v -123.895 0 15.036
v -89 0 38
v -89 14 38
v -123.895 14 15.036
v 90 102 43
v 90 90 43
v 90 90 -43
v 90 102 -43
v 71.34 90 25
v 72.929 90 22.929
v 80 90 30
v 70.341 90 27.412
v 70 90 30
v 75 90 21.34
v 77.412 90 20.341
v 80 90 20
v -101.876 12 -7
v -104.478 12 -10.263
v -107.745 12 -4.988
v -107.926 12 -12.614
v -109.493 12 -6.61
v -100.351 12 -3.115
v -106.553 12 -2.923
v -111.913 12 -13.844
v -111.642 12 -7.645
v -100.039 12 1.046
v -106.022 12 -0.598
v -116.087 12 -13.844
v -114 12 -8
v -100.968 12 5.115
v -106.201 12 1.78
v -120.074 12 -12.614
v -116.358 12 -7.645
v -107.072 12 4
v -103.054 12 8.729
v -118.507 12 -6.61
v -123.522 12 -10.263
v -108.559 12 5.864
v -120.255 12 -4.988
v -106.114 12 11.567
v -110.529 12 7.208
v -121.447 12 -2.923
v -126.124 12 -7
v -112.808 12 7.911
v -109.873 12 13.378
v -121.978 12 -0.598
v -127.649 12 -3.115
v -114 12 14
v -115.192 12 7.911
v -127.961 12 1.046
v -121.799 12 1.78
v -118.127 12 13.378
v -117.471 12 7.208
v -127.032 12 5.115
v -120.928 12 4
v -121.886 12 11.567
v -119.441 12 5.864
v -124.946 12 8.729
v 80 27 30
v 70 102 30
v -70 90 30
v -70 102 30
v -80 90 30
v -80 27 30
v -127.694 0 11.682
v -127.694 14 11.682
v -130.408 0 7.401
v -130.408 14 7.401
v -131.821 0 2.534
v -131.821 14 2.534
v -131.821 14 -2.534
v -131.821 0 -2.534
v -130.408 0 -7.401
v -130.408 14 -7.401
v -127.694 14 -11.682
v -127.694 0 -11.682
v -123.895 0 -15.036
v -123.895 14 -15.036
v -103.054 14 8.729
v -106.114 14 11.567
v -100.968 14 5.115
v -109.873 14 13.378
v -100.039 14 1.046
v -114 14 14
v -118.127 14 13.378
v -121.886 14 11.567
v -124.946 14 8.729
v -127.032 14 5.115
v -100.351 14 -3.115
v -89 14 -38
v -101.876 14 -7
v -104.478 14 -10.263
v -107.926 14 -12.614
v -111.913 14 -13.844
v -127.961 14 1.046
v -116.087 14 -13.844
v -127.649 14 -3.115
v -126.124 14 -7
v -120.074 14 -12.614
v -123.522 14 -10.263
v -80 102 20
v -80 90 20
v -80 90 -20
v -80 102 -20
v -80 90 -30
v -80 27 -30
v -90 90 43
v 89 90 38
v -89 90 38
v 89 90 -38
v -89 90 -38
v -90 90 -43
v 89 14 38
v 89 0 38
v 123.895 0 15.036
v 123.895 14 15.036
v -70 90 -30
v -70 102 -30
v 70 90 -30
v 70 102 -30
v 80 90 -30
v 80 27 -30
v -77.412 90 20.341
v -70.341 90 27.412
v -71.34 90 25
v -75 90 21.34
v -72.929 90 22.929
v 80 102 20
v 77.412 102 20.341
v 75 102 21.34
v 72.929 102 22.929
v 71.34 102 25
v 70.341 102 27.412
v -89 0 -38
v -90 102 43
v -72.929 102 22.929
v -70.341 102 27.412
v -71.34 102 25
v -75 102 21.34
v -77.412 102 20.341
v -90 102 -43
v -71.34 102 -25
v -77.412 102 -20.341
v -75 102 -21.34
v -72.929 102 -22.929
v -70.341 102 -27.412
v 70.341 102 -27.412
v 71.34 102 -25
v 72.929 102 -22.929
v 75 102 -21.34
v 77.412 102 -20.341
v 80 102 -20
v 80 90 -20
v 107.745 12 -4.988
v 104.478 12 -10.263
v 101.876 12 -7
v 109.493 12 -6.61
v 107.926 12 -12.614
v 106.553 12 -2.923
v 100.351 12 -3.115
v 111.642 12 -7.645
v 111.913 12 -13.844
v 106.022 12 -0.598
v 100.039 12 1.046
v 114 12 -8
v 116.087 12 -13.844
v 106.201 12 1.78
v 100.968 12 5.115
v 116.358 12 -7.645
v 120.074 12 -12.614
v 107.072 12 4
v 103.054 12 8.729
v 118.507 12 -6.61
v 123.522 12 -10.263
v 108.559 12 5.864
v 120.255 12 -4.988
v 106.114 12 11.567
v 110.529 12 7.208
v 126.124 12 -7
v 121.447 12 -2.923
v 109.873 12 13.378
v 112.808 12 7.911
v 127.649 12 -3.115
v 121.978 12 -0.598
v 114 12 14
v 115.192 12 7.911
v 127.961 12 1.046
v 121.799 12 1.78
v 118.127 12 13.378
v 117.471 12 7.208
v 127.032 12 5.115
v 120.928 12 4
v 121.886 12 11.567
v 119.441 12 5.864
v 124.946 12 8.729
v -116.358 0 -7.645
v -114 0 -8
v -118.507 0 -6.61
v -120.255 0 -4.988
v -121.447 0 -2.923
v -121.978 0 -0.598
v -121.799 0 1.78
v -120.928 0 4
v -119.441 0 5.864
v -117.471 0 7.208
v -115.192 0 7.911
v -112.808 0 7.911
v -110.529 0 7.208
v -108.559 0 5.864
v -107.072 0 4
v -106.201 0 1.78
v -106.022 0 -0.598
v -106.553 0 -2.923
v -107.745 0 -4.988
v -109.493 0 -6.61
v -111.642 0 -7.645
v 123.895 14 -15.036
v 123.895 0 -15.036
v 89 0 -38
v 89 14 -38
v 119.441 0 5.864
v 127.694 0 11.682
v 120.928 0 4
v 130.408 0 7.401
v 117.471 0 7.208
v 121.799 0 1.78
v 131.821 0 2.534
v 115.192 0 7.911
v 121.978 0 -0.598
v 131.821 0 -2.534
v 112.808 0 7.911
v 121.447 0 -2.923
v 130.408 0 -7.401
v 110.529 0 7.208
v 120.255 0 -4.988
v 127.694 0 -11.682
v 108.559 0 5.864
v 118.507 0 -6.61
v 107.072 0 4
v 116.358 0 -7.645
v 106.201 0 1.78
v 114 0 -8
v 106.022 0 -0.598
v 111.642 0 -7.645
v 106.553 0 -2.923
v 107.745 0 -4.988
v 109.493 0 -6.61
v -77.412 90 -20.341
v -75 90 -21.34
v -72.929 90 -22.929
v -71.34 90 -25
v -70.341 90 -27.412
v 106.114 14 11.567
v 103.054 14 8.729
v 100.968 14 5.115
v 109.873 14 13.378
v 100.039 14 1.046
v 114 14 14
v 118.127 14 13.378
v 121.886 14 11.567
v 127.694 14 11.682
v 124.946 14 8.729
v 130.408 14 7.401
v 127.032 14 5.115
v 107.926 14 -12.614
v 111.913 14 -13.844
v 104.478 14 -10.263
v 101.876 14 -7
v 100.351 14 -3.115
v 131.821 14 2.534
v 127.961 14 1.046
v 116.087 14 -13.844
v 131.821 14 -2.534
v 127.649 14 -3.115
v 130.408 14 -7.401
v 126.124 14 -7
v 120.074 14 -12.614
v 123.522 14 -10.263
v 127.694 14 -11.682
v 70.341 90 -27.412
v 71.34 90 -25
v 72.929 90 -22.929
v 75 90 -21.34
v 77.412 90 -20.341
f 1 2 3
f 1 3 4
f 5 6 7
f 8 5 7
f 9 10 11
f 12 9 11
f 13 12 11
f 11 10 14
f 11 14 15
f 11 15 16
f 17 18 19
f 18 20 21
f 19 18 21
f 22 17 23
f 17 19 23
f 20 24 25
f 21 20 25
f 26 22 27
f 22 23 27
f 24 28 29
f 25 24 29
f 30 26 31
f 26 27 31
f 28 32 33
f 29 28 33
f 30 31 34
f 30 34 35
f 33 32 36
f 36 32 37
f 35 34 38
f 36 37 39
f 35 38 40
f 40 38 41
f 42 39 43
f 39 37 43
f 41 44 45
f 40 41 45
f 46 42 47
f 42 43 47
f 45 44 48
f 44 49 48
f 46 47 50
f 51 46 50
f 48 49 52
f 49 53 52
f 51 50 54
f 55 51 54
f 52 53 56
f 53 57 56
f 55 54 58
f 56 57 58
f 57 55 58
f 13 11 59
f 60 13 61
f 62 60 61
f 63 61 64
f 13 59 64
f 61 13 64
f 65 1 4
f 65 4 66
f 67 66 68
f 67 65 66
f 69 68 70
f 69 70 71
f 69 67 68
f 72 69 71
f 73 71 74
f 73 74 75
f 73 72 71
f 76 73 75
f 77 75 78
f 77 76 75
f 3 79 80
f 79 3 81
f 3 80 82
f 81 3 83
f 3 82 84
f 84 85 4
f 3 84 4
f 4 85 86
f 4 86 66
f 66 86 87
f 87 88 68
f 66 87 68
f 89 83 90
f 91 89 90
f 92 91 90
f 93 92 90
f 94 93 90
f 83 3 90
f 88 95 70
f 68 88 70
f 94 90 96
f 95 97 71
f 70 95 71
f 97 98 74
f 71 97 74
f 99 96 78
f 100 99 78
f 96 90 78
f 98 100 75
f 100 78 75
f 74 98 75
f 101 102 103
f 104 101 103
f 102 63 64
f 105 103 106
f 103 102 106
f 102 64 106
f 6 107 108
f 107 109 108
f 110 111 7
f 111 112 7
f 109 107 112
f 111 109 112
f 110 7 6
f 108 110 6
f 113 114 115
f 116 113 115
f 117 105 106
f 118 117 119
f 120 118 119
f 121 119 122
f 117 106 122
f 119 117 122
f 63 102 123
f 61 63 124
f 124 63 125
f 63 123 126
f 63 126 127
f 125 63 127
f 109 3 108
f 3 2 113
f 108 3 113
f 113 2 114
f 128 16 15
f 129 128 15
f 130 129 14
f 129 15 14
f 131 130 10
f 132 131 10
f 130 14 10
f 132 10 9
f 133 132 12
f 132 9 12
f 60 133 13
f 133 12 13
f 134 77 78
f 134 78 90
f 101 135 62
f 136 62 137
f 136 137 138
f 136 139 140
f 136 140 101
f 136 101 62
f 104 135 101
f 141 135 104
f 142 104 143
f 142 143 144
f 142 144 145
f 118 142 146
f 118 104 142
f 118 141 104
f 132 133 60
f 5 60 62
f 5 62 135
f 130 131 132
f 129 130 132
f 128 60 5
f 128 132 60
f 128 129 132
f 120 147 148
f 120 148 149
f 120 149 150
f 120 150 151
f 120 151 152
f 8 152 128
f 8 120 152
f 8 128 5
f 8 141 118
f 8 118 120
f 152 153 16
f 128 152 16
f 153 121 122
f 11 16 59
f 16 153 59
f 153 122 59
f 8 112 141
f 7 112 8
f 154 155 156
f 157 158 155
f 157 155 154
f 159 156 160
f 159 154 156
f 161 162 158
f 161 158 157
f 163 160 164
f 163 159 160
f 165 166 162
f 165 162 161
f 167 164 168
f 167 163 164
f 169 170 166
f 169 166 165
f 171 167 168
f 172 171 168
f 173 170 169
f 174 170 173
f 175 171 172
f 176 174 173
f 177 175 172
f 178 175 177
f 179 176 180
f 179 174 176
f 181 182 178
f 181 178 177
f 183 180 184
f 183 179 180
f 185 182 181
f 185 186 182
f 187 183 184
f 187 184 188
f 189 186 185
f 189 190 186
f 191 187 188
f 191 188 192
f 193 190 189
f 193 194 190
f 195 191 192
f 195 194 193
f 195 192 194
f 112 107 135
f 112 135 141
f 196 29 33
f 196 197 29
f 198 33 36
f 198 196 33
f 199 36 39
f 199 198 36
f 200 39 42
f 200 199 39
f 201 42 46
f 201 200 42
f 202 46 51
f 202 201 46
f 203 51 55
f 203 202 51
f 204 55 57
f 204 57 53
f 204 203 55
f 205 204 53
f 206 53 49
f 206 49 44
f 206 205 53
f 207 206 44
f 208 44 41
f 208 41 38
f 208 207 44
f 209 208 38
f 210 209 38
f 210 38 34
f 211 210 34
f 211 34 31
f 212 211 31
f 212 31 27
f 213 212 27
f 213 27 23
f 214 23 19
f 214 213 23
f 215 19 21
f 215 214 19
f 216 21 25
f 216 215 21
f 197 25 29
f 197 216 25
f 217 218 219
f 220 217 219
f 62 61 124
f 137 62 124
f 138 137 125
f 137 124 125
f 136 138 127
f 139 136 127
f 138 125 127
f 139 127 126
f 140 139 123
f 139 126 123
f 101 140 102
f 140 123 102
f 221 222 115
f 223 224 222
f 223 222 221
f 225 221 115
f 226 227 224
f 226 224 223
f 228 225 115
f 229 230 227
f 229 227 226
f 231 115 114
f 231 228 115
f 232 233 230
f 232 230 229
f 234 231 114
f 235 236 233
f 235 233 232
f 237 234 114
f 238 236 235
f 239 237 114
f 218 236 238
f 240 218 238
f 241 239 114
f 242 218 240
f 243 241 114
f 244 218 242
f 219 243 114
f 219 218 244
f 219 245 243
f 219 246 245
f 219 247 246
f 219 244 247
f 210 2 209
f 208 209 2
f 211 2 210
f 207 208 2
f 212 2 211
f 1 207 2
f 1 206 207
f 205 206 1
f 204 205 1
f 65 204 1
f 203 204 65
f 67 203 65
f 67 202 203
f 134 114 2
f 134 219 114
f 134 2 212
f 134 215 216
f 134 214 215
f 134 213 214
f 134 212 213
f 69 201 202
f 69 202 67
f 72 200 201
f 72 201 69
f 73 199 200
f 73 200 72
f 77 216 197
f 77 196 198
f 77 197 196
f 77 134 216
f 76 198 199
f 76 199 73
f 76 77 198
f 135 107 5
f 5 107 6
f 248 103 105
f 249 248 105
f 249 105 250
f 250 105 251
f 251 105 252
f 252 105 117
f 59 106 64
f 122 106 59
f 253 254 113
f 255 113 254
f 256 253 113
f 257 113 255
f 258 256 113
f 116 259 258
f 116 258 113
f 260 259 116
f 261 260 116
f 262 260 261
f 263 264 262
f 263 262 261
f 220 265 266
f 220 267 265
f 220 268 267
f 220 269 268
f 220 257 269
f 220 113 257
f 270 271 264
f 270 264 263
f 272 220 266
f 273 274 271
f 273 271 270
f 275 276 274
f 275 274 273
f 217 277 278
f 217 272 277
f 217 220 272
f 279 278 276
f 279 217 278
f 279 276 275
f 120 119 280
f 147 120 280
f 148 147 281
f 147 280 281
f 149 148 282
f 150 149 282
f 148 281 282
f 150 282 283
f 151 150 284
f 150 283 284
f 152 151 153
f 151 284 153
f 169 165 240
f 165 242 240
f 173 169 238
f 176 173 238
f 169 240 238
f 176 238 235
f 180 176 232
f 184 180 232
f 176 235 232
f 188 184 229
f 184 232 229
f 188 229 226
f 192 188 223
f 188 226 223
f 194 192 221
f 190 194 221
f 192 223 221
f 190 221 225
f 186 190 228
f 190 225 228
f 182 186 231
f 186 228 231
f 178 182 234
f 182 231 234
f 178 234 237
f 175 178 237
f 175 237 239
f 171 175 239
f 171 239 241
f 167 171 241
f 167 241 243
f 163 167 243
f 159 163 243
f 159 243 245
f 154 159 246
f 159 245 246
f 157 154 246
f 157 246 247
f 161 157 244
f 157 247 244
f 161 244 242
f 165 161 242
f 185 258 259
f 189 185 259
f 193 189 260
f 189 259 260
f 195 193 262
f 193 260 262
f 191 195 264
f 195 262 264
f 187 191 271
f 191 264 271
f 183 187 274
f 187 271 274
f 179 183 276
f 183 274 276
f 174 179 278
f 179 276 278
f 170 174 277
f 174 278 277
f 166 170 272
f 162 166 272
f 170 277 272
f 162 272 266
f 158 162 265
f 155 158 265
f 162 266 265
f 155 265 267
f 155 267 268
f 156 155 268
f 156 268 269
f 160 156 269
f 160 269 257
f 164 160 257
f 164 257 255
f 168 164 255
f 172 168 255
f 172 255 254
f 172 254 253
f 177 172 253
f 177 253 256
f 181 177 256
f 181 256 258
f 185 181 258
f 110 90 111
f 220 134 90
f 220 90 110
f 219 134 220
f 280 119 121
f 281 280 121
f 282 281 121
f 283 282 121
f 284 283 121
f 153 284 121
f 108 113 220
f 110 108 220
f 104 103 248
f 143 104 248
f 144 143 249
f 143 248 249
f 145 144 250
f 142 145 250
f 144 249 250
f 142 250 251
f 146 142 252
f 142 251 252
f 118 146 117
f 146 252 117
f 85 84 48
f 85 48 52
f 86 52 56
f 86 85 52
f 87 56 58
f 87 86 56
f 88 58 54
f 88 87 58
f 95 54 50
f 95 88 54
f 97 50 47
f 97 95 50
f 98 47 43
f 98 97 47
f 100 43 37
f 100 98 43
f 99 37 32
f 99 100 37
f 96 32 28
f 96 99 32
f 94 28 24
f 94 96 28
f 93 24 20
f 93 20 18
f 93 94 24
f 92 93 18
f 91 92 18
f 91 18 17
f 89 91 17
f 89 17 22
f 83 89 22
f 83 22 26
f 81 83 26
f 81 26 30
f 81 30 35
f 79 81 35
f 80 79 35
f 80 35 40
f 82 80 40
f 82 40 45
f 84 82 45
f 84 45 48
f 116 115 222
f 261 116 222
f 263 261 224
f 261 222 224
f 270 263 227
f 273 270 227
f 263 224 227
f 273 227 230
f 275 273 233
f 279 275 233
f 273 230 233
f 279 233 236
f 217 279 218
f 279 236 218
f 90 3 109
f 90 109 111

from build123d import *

# Parameters (mm, degrees)
SKETCH1_W                                = 178
SKETCH1_H                                = 76
BOSS_EXTRUDE1_DEPTH                      = 90
BOSS_EXTRUDE2_DEPTH                      = 14
CBORE_FOR_M14_HEX_HEAD_BOLT1_D           = 16
CBORE_FOR_M14_HEX_HEAD_BOLT1_CBORE_D     = 28
CBORE_FOR_M14_HEX_HEAD_BOLT1_CBORE_DEPTH = 2
SKETCH4_W                                = 160
SKETCH4_H                                = 60
CUT_EXTRUDE1_DEPTH                       = 63
SKETCH5_W                                = 180
SKETCH5_H                                = 86
SKETCH5_W_2                              = 178
SKETCH5_H_2                              = 76
BOSS_EXTRUDE4_DEPTH                      = 12


with BuildPart() as part:
    # Sketch1 → Boss-Extrude1 (new body)
    with BuildSketch(Plane(origin=(0, 0, 0), x_dir=(1, 0, 0), z_dir=(0, 1, 0))):
        Rectangle(SKETCH1_W, SKETCH1_H)
    extrude(amount=BOSS_EXTRUDE1_DEPTH)

    # Sketch2 → Boss-Extrude2 (add)
    with BuildSketch(Plane(origin=(0, 0, 0), x_dir=(1, 0, 0), z_dir=(0, 1, 0))):
        with BuildLine():
            Line((123.89505406, 15.036219776), (89, 38))
            Line((89, 38), (89, -38))
            Line((89, -38), (123.89505406, -15.036219776))
            ThreePointArc((123.89505406, -15.036219776), (132, 0), (123.89505406, 15.036219776))
        make_face()
    boss_extrude2 = extrude(amount=BOSS_EXTRUDE2_DEPTH)

    # CBORE for M14 Hex Head Bolt1 (through all)
    with Locations(Plane(origin=(114, 14, 0), x_dir=(0, 0, 1), z_dir=(0, 1, 0))):
        with Locations((0, 0)):
            cbore_for_m14_hex_head_bolt1 = CounterBoreHole(CBORE_FOR_M14_HEX_HEAD_BOLT1_D / 2, CBORE_FOR_M14_HEX_HEAD_BOLT1_CBORE_D / 2, CBORE_FOR_M14_HEX_HEAD_BOLT1_CBORE_DEPTH)

    # Mirror1: Boss-Extrude2, CBORE for M14 Hex Head Bolt1 across plane
    add(boss_extrude2.mirror(Plane(origin=(0, 0, 0), x_dir=(0, 0, 1), z_dir=(1, 0, 0))))
    add(cbore_for_m14_hex_head_bolt1.mirror(Plane(origin=(0, 0, 0), x_dir=(0, 0, 1), z_dir=(1, 0, 0))), mode=Mode.SUBTRACT)

    # Sketch4 → Cut-Extrude1 (cut)
    with BuildSketch(Plane(origin=(0, 90, 0), x_dir=(1, 0, 0), z_dir=(0, 1, 0))):
        Rectangle(SKETCH4_W, SKETCH4_H)
    extrude(amount=-CUT_EXTRUDE1_DEPTH, mode=Mode.SUBTRACT)

    # Sketch5 → Boss-Extrude4 (add)
    # profile 1 of 6: a face of its own
    with BuildSketch(Plane(origin=(0, 90, 0), x_dir=(1, 0, 0), z_dir=(0, 1, 0))):
        Rectangle(SKETCH5_W, SKETCH5_H)
        Rectangle(SKETCH5_W_2, SKETCH5_H_2, mode=Mode.SUBTRACT)
    # profile 2 of 6: a face of its own
    with BuildSketch(Plane(origin=(0, 90, 0), x_dir=(1, 0, 0), z_dir=(0, 1, 0))):
        Rectangle(SKETCH5_W_2, SKETCH5_H_2)
        Polygon((70, -30), (-70, -30), (-80, -30), (-80, -20), (-80, 20), (-80, 30), (-70, 30), (70, 30), (80, 30), (80, 20), (80, -20), (80, -30), align=None, mode=Mode.SUBTRACT)
    # profile 3 of 6: a face of its own
    with BuildSketch(Plane(origin=(0, 90, 0), x_dir=(1, 0, 0), z_dir=(0, 1, 0))):
        with BuildLine():
            Line((-80, 30), (-80, 20))
            ThreePointArc((-80, 20), (-72.928932188, 22.928932188), (-70, 30))
            Line((-70, 30), (-80, 30))
        make_face()
    # profile 4 of 6: a face of its own
    with BuildSketch(Plane(origin=(0, 90, 0), x_dir=(1, 0, 0), z_dir=(0, 1, 0))):
        with BuildLine():
            Line((-80, -30), (-70, -30))
            ThreePointArc((-70, -30), (-72.928932188, -22.928932188), (-80, -20))
            Line((-80, -20), (-80, -30))
        make_face()
    # profile 5 of 6: a face of its own
    with BuildSketch(Plane(origin=(0, 90, 0), x_dir=(1, 0, 0), z_dir=(0, 1, 0))):
        with BuildLine():
            ThreePointArc((80, -20), (72.928932188, -22.928932188), (70, -30))
            Line((70, -30), (80, -30))
            Line((80, -30), (80, -20))
        make_face()
    # profile 6 of 6: a face of its own
    with BuildSketch(Plane(origin=(0, 90, 0), x_dir=(1, 0, 0), z_dir=(0, 1, 0))):
        with BuildLine():
            ThreePointArc((70, 30), (72.928932188, 22.928932188), (80, 20))
            Line((80, 20), (80, 30))
            Line((80, 30), (70, 30))
        make_face()
    extrude(amount=BOSS_EXTRUDE4_DEPTH)


solid = part.part
